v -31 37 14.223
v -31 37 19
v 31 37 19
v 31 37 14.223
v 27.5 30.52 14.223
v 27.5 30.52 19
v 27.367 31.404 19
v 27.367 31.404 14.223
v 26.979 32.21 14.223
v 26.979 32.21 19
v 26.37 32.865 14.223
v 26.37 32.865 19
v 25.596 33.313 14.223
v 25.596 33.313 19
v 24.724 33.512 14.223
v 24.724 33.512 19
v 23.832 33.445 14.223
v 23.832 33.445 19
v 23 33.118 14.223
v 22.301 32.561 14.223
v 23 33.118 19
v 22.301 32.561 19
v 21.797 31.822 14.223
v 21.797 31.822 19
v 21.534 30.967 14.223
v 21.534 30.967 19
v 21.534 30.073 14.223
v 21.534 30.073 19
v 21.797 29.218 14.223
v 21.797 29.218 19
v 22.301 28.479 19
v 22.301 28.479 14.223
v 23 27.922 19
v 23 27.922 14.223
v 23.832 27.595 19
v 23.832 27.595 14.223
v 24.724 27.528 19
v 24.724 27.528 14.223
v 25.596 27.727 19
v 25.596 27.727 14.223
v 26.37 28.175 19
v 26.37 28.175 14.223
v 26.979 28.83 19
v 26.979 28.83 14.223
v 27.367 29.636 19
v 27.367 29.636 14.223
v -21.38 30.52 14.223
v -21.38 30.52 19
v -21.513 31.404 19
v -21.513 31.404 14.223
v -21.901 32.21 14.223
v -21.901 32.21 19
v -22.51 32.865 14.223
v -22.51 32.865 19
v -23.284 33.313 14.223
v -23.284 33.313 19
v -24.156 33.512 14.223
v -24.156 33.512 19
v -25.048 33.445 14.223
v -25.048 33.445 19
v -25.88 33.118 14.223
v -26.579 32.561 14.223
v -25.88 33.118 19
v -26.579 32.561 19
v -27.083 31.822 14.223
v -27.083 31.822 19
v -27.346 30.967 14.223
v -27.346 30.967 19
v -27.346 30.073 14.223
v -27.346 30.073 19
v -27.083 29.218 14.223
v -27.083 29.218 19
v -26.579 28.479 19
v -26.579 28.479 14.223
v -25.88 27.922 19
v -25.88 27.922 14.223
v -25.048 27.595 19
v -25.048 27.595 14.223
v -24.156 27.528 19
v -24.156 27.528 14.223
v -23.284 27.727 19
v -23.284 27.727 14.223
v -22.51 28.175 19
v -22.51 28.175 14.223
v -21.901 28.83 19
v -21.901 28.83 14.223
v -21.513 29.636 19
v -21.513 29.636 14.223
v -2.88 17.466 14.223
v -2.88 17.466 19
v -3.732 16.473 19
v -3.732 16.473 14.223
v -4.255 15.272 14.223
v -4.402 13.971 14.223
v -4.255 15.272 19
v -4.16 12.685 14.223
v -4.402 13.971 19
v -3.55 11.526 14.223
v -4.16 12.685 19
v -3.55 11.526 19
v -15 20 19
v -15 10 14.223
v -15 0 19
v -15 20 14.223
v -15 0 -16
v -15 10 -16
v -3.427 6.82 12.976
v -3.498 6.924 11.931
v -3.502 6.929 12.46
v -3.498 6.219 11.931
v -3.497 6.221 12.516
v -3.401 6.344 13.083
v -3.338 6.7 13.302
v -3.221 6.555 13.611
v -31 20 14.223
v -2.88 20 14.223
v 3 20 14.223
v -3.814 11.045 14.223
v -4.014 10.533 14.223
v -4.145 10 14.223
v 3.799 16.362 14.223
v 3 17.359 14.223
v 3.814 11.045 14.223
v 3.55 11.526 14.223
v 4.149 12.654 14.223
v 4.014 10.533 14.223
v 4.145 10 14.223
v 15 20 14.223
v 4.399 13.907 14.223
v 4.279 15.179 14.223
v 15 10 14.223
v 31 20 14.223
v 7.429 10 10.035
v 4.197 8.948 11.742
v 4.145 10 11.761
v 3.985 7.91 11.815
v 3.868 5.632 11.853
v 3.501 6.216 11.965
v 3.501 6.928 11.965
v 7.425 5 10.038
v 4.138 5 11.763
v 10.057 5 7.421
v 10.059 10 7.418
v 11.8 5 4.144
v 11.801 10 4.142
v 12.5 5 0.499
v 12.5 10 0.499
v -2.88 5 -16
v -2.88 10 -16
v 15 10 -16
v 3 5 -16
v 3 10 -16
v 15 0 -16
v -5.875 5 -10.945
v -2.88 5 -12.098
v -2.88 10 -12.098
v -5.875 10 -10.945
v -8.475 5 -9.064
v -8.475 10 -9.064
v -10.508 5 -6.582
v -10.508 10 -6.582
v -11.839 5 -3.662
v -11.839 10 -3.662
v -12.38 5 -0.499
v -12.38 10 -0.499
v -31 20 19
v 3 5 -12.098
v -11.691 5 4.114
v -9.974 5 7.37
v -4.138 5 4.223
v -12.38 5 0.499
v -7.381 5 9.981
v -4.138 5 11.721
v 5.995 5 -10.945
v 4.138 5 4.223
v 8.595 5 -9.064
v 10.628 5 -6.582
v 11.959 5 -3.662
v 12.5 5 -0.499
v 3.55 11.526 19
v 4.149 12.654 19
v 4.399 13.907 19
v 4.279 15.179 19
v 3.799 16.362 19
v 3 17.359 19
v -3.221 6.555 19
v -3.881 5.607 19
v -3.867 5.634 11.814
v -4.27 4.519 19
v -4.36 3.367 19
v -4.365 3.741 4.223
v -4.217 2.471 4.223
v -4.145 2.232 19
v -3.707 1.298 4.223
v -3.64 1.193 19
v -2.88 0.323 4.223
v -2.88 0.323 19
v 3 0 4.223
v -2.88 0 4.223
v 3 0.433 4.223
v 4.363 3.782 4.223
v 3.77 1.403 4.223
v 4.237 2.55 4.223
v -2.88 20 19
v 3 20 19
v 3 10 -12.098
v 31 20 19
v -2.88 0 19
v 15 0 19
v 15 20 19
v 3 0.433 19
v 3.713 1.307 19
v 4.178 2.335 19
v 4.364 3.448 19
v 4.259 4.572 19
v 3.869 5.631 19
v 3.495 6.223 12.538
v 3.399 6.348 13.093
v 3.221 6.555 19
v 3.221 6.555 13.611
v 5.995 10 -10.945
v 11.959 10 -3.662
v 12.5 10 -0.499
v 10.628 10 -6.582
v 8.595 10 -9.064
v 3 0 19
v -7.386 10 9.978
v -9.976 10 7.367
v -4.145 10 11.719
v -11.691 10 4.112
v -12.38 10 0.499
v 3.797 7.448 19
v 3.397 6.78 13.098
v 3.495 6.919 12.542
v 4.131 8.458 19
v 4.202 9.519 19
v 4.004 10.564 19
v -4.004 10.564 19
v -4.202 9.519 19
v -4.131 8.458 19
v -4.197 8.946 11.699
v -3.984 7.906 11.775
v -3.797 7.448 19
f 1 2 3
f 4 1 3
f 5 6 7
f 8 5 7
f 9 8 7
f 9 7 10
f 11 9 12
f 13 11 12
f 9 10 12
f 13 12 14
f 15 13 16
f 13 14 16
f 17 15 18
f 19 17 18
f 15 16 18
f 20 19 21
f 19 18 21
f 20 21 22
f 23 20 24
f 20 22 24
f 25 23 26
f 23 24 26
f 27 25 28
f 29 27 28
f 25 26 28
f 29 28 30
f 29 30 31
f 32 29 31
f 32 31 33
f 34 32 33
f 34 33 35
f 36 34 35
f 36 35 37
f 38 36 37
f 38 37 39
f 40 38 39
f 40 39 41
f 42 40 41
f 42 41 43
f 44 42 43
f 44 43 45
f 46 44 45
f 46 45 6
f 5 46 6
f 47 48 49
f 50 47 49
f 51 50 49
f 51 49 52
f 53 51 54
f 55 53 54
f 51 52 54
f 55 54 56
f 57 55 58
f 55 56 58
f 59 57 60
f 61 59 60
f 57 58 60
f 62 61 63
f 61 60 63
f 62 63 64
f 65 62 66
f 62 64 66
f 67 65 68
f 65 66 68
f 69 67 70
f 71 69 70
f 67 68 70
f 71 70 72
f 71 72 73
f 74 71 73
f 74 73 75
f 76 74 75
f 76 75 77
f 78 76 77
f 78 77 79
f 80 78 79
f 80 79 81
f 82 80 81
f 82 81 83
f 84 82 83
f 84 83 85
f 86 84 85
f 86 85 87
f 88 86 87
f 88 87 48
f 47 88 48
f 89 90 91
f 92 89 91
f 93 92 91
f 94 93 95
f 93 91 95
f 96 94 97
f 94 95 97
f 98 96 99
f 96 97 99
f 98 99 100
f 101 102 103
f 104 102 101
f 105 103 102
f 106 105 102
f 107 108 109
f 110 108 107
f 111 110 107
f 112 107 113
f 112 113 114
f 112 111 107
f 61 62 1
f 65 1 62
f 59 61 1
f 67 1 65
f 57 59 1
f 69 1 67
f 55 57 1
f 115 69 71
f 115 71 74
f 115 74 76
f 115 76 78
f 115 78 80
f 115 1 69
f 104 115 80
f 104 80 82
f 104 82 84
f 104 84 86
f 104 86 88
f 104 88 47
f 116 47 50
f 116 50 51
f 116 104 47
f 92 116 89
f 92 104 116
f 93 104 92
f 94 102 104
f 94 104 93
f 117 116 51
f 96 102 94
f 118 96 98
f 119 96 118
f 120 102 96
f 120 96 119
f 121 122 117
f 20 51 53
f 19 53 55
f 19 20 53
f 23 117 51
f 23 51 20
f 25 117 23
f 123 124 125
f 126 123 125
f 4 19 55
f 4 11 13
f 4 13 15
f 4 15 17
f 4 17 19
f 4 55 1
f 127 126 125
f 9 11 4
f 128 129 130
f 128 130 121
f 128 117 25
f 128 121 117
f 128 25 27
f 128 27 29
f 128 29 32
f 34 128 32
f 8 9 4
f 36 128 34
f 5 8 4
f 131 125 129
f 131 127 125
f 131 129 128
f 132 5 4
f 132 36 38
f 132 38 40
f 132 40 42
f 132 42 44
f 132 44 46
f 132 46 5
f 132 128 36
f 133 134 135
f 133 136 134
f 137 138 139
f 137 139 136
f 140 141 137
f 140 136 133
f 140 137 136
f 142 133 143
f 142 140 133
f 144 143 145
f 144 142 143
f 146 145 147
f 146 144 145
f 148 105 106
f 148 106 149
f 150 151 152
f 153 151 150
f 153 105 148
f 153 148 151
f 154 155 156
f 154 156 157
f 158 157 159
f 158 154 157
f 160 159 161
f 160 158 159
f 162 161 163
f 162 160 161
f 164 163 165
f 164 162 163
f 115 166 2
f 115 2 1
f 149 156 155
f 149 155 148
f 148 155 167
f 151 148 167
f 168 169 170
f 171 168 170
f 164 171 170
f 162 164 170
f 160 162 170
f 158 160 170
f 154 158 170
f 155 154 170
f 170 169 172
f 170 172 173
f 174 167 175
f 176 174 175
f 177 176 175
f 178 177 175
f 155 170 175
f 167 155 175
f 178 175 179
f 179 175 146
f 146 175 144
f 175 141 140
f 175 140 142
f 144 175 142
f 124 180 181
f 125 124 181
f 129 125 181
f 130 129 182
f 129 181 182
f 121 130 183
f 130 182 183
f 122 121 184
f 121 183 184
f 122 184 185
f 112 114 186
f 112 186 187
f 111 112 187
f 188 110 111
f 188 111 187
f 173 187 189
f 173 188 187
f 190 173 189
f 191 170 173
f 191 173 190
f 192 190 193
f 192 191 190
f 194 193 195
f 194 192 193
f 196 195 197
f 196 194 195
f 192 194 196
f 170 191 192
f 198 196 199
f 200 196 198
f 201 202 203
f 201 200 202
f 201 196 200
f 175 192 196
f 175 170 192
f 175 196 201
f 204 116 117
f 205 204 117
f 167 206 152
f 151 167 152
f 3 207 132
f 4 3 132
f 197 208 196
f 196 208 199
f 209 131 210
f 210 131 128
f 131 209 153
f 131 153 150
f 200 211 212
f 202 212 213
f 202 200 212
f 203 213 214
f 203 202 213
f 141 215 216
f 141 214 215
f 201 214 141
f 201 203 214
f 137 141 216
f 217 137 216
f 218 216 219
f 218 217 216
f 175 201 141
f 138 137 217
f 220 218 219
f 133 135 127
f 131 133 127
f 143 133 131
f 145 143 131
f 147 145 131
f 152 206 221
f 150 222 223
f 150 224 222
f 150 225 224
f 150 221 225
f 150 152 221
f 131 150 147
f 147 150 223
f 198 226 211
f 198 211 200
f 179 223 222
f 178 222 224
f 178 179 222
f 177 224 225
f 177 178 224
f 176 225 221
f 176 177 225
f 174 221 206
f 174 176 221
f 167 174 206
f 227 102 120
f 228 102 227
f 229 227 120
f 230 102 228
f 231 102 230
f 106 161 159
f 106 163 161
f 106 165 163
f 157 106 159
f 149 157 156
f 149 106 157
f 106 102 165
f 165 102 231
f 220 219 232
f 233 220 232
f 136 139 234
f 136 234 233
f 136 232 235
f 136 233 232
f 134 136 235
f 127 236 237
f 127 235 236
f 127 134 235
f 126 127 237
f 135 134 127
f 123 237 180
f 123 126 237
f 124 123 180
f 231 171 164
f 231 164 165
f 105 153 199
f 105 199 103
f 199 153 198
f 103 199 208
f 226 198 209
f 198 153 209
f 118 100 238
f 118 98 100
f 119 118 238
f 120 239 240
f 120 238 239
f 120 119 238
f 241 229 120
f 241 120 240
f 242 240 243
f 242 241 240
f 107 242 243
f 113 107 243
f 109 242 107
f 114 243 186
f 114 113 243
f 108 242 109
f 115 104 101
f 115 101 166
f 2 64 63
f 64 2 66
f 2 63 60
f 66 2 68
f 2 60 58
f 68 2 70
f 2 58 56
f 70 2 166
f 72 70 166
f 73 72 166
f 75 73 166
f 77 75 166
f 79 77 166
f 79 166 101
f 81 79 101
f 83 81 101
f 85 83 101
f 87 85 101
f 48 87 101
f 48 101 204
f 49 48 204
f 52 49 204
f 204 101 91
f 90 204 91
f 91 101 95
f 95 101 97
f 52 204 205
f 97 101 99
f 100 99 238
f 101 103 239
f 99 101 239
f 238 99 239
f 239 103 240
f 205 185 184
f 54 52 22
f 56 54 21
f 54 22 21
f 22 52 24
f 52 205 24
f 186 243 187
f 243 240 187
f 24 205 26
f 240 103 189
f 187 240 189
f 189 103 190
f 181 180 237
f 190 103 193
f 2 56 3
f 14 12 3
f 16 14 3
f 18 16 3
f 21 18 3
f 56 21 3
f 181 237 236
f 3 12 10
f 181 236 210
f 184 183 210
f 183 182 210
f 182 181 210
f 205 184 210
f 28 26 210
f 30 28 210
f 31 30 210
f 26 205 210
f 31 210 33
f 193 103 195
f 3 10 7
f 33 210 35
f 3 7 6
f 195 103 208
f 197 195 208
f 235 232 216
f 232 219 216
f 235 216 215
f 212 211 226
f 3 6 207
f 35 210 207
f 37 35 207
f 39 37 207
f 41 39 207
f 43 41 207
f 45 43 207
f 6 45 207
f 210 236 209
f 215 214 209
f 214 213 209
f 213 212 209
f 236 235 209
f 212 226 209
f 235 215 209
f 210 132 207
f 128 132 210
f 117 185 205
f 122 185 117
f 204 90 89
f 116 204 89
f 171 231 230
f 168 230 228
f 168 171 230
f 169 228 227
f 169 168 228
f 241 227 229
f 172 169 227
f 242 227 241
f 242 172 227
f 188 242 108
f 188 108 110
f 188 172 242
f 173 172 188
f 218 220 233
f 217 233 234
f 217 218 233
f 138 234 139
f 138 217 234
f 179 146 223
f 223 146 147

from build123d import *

# Parameters (mm, degrees)
SKETCH_1_W                = 70
SKETCH_1_H                = 43
EXTRUDE_1_DEPTH           = 10
SKETCH_8_W                = 24.88
SKETCH_8_H                = 5
CUT_EXTRUDE_4_DEPTH       = 57.338264084
EXTRUDE_1_2_DEPTH         = 5
EXTRUDE_1_2_DEPTH_BACK    = 2
SKETCH_11_R               = 20.45
SKETCH_11_R_2             = 12.45
CUT_EXTRUDE_6_DEPTH       = 5
CUT_EXTRUDE_7_DEPTH       = 5
SKETCH_16_W               = 5.88
SKETCH_16_H               = 11
CUT_EXTRUDE_8_DEPTH       = 5
SKETCH_17_W               = 5.88
SKETCH_17_H               = 8.352111755
CUT_EXTRUDE_9_DEPTH       = 5
CUT_EXTRUDE_10_DEPTH      = 5
CUT_EXTRUDE_11_DEPTH      = 5
SKETCH_21_R               = 3
CUT_EXTRUDE_12_DEPTH      = 43.275879648
SKETCH_22_R               = 3
CUT_EXTRUDE_13_DEPTH      = 43.275879648
SKETCH_24_R               = 3.51
CUT_EXTRUDE_15_DEPTH      = 7
SKETCH_25_W               = 22.5
SKETCH_25_H               = 10
EXTRUDE_2_DEPTH           = 5
SKETCH_26_W               = 22.62
SKETCH_26_H               = 10
EXTRUDE_3_DEPTH           = 5
SKETCH_28_W               = 5.88
SKETCH_28_H               = 7.531424881
CUT_EXTRUDE_16_DEPTH      = 5
CUT_EXTRUDE_2_DEPTH       = 45
CUT_EXTRUDE_2_DEPTH_BACK  = 31
SKETCH_32_W               = 110
SKETCH_32_H               = 112
SKETCH_32_W_2             = 30
SKETCH_32_H_2             = 32
SKETCH_33_W               = 12
SKETCH_33_H               = 10
SKETCH_33_W_2             = 12.12
EXTRUDE_5_DEPTH           = 3
SKETCH_40_W               = 12
SKETCH_40_H               = 4.777354505
EXTRUDE_7_DEPTH           = 10
SKETCH_41_W               = 12.12
SKETCH_41_H               = 4.777354505
EXTRUDE_8_DEPTH           = 10
CUT_EXTRUDE_17_DEPTH      = 10
CUT_EXTRUDE_17_DEPTH_BACK = 10
SKETCH_42_R               = 4.209320402
SKETCH_53_W               = 4.777354505
SKETCH_53_H               = 10
EXTRUDE_9_DEPTH           = 11
SKETCH_56_W               = 4.777354505
SKETCH_56_H               = 20
EXTRUDE_10_DEPTH          = 11
SKETCH_57_W               = 4.777354505
SKETCH_57_H               = 10
CUT_EXTRUDE_18_DEPTH      = 11
SKETCH_58_W               = 4.777354505
SKETCH_58_H               = 10
EXTRUDE_11_DEPTH          = 5
SKETCH_59_W               = 4.777354505
SKETCH_59_H               = 10
EXTRUDE_12_DEPTH          = 5
SKETCH_60_W               = 62
SKETCH_60_H               = 4.777354505
EXTRUDE_13_DEPTH          = 10
SKETCH_61_W               = 5.88
SKETCH_61_H               = 5
CUT_EXTRUDE_19_DEPTH      = 10
SKETCH_69_W               = 4.777354505
SKETCH_69_H               = 10
EXTRUDE_14_DEPTH          = 16
SKETCH_70_W               = 4.777354505
SKETCH_70_H               = 10
EXTRUDE_15_DEPTH          = 16
SKETCH_83_W               = 62
SKETCH_83_H               = 4.777354505
EXTRUDE_16_DEPTH          = 29
SKETCH_86_R               = 3
CUT_EXTRUDE_20_DEPTH      = 76.279479276
SKETCH_85_R               = 3
CUT_EXTRUDE_21_DEPTH      = 76.279479276
SKETCH_87_W               = 62
SKETCH_87_H               = 22
CUT_EXTRUDE_22_DEPTH      = 76.279479276
SKETCH_90_W               = 16.042506896
SKETCH_90_H               = 20
SKETCH_90_W_2             = 16.042536038
CUT_EXTRUDE_23_DEPTH      = 10
SKETCH_91_R               = 4.404741758
CUT_EXTRUDE_24_DEPTH      = 10
SKETCH_92_R               = 4.366810658
CUT_EXTRUDE_25_DEPTH      = 53.335030246


with BuildPart() as part:
    # 草圖1 → Extrude 1 (new body)
    with BuildSketch(Plane(origin=(0, 0, 0), x_dir=(1, 0, 0), z_dir=(0, 1, 0))):
        Rectangle(SKETCH_1_W, SKETCH_1_H)
    extrude(amount=EXTRUDE_1_DEPTH)

    # 草圖8 → 除料-伸長4 (cut, through all)
    with BuildSketch(Plane.XY.offset(21.5)):
        with Locations((0.06, 7.5)):
            Rectangle(SKETCH_8_W, SKETCH_8_H)
    extrude(amount=-CUT_EXTRUDE_4_DEPTH, mode=Mode.SUBTRACT)

    # 草圖11 → Extrude 1 2 (add, two sides: drawn at the far end of the back side and taken through both)
    with BuildSketch(Plane(origin=(0, 5, 0), x_dir=(1, 0, 0), z_dir=(0, 1, 0)).offset(-EXTRUDE_1_2_DEPTH_BACK)):
        with Locations((0.06, 0)):
            Circle(SKETCH_11_R)
        with Locations((0.06, 0)):
            Circle(SKETCH_11_R_2, mode=Mode.SUBTRACT)
    extrude(amount=EXTRUDE_1_2_DEPTH + EXTRUDE_1_2_DEPTH_BACK)

    # 草圖14 → 除料-伸長6 (cut)
    with BuildSketch(Plane(origin=(0, 5, 0), x_dir=(1, 0, 0), z_dir=(0, 1, 0))):
        Polygon((0.06, -20.45), (12.5, -20.45), (12.5, -21.5), (-12.38, -21.5), (-12.38, -20.45), align=None)
    extrude(amount=-CUT_EXTRUDE_6_DEPTH, mode=Mode.SUBTRACT)

    # 草圖15 → 除料-伸長7 (cut)
    with BuildSketch(Plane(origin=(0, 5, 0), x_dir=(1, 0, 0), z_dir=(0, 1, 0))):
        Polygon((0.06, 20.45), (12.5, 20.45), (12.5, 21.5), (-12.38, 21.5), (-12.38, 20.45), align=None)
    extrude(amount=-CUT_EXTRUDE_7_DEPTH, mode=Mode.SUBTRACT)

    # 草圖16 → 除料-伸長8 (cut)
    with BuildSketch(Plane(origin=(0, 10, 0), x_dir=(1, 0, 0), z_dir=(0, 1, 0))):
        with Locations((0.06, 17.597888245)):
            Rectangle(SKETCH_16_W, SKETCH_16_H)
    extrude(amount=-CUT_EXTRUDE_8_DEPTH, mode=Mode.SUBTRACT)

    # 草圖17 → 除料-伸長9 (cut)
    with BuildSketch(Plane(origin=(0, 10, 0), x_dir=(1, 0, 0), z_dir=(0, 1, 0))):
        with Locations((0.06, -16.273944123)):
            Rectangle(SKETCH_17_W, SKETCH_17_H)
    extrude(amount=-CUT_EXTRUDE_9_DEPTH, mode=Mode.SUBTRACT)

    # 草圖19 → 除料-伸長10 (cut)
    with BuildSketch(Plane(origin=(0, 5, 0), x_dir=(1, 0, 0), z_dir=(0, 1, 0))):
        Polygon((-2.88, 20.237561612), (-2.88, 20.45), (2.98755849, 20.45), (3, 20.237561612), align=None)
    extrude(amount=-CUT_EXTRUDE_10_DEPTH, mode=Mode.SUBTRACT)

    # 草圖20 → 除料-伸長11 (cut)
    with BuildSketch(Plane(origin=(0, 5, 0), x_dir=(1, 0, 0), z_dir=(0, 1, 0))):
        Polygon((3, -20.237561612), (3, -20.45), (-2.887827835, -20.45), (-2.88, -20.237561612), align=None)
    extrude(amount=-CUT_EXTRUDE_11_DEPTH, mode=Mode.SUBTRACT)

    # 草圖21 → 除料-伸長12 (cut, through all)
    with BuildSketch(Plane(origin=(0, 10, 0), x_dir=(1, 0, 0), z_dir=(0, 1, 0))):
        with Locations(Location((-25, 11.5, 0), (0, 0, 270))):
            Circle(SKETCH_21_R)
    extrude(amount=-CUT_EXTRUDE_12_DEPTH, mode=Mode.SUBTRACT)

    # 草圖22 → 除料-伸長13 (cut, through all)
    with BuildSketch(Plane(origin=(0, 10, 0), x_dir=(1, 0, 0), z_dir=(0, 1, 0))):
        with Locations(Location((25, 11.5, 0), (0, 0, 270))):
            Circle(SKETCH_22_R)
    extrude(amount=-CUT_EXTRUDE_13_DEPTH, mode=Mode.SUBTRACT)

    # 草圖24 → 除料-伸長15 (cut)
    with BuildSketch(Plane(origin=(0, 5, 0), x_dir=(1, 0, 0), z_dir=(0, 1, 0))):
        with Locations((0, -12.216230782)):
            Circle(SKETCH_24_R)
    extrude(amount=CUT_EXTRUDE_15_DEPTH, mode=Mode.SUBTRACT)

    # 草圖25 → 填料-伸長2 (add)
    with BuildSketch(Plane.XY.offset(21.5)):
        with Locations((23.75, 5)):
            Rectangle(SKETCH_25_W, SKETCH_25_H)
    extrude(amount=EXTRUDE_2_DEPTH)

    # 草圖26 → 填料-伸長3 (add)
    with BuildSketch(Plane.XY.offset(21.5)):
        with Locations((-23.69, 5)):
            Rectangle(SKETCH_26_W, SKETCH_26_H)
    extrude(amount=EXTRUDE_3_DEPTH)

    # 草圖28 → 除料-伸長16 (cut)
    with BuildSketch(Plane(origin=(0, 5, 0), x_dir=(1, 0, 0), z_dir=(0, 1, 0))):
        with Locations((0.06, -17.988357936)):
            Rectangle(SKETCH_28_W, SKETCH_28_H)
    extrude(amount=-CUT_EXTRUDE_16_DEPTH, mode=Mode.SUBTRACT)

    # 草圖32 → 除料-伸長-薄件2 (cut, two sides: drawn at the far end of the back side and taken through both)
    with BuildSketch(Plane(origin=(0, 5, 0), x_dir=(1, 0, 0), z_dir=(0, 1, 0)).offset(-CUT_EXTRUDE_2_DEPTH_BACK)):
        Rectangle(SKETCH_32_W, SKETCH_32_H)
        Rectangle(SKETCH_32_W_2, SKETCH_32_H_2, mode=Mode.SUBTRACT)
    extrude(amount=CUT_EXTRUDE_2_DEPTH + CUT_EXTRUDE_2_DEPTH_BACK, mode=Mode.SUBTRACT)

    # 草圖33 → 填料-伸長5 (add)
    with BuildSketch(Plane.XY.offset(16)):
        with Locations((9, 5)):
            Rectangle(SKETCH_33_W, SKETCH_33_H)
        with Locations((-8.94, 5)):
            Rectangle(SKETCH_33_W_2, SKETCH_33_H)
    extrude(amount=EXTRUDE_5_DEPTH)

    # 草圖40 → 填料-伸長7 (add)
    with BuildSketch(Plane(origin=(0, 10, 0), x_dir=(1, 0, 0), z_dir=(0, 1, 0))):
        with Locations((9, -16.611322748)):
            Rectangle(SKETCH_40_W, SKETCH_40_H)
    extrude(amount=EXTRUDE_7_DEPTH)

    # 草圖41 → 填料-伸長8 (add)
    with BuildSketch(Plane(origin=(0, 10, 0), x_dir=(1, 0, 0), z_dir=(0, 1, 0))):
        with Locations((-8.94, -16.611322748)):
            Rectangle(SKETCH_41_W, SKETCH_41_H)
    extrude(amount=EXTRUDE_8_DEPTH)

    # 草圖42 → 除料-伸長17 (cut, two sides: drawn at the far end of the back side and taken through both)
    with BuildSketch(Plane.XY.offset(14.222645495).offset(-CUT_EXTRUDE_17_DEPTH_BACK)):
        with Locations((0, 9.264740645)):
            Circle(SKETCH_42_R)
    extrude(amount=CUT_EXTRUDE_17_DEPTH + CUT_EXTRUDE_17_DEPTH_BACK, mode=Mode.SUBTRACT)

    # 草圖53 → 填料-伸長9 (add)
    with BuildSketch(Plane.ZY.offset(15)):
        with Locations((16.611322748, 15)):
            Rectangle(SKETCH_53_W, SKETCH_53_H)
    extrude(amount=EXTRUDE_9_DEPTH)

    # 草圖56 → 填料-伸長10 (add)
    with BuildSketch(Plane(origin=(15, 0, 0), x_dir=(0, 0, -1), z_dir=(1, 0, 0))):
        with Locations((-16.611322748, 10)):
            Rectangle(SKETCH_56_W, SKETCH_56_H)
    extrude(amount=EXTRUDE_10_DEPTH)

    # 草圖57 → 除料-伸長18 (cut)
    with BuildSketch(Plane(origin=(26, 0, 0), x_dir=(0, 0, -1), z_dir=(1, 0, 0))):
        with Locations((-16.611322748, 5)):
            Rectangle(SKETCH_57_W, SKETCH_57_H)
    extrude(amount=-CUT_EXTRUDE_18_DEPTH, mode=Mode.SUBTRACT)

    # 草圖58 → 填料-伸長11 (add)
    with BuildSketch(Plane(origin=(26, 0, 0), x_dir=(0, 0, -1), z_dir=(1, 0, 0))):
        with Locations((-16.611322748, 15)):
            Rectangle(SKETCH_58_W, SKETCH_58_H)
    extrude(amount=EXTRUDE_11_DEPTH)

    # 草圖59 → 填料-伸長12 (add)
    with BuildSketch(Plane.ZY.offset(26)):
        with Locations((16.611322748, 15)):
            Rectangle(SKETCH_59_W, SKETCH_59_H)
    extrude(amount=EXTRUDE_12_DEPTH)

    # 草圖60 → 填料-伸長13 (add)
    with BuildSketch(Plane(origin=(0, 20, 0), x_dir=(1, 0, 0), z_dir=(0, 1, 0))):
        with Locations((0, -16.611322748)):
            Rectangle(SKETCH_60_W, SKETCH_60_H)
    extrude(amount=EXTRUDE_13_DEPTH)

    # 草圖61 → 除料-伸長19 (cut)
    with BuildSketch(Plane.XY.offset(14.222645495)):
        with Locations((0.06, 2.5)):
            Rectangle(SKETCH_61_W, SKETCH_61_H)
    extrude(amount=-CUT_EXTRUDE_19_DEPTH, mode=Mode.SUBTRACT)

    # 草圖69 → 填料-伸長14 (add)
    with BuildSketch(Plane(origin=(15, 0, 0), x_dir=(0, 0, -1), z_dir=(1, 0, 0))):
        with Locations((-16.611322748, 5)):
            Rectangle(SKETCH_69_W, SKETCH_69_H)
    extrude(amount=EXTRUDE_14_DEPTH)

    # 草圖70 → 填料-伸長15 (add)
    with BuildSketch(Plane.ZY.offset(15)):
        with Locations((16.611322748, 5)):
            Rectangle(SKETCH_70_W, SKETCH_70_H)
    extrude(amount=EXTRUDE_15_DEPTH)

    # 草圖83 → 填料-伸長16 (add)
    with BuildSketch(Plane(origin=(0, 30, 0), x_dir=(1, 0, 0), z_dir=(0, 1, 0))):
        with Locations((0, -16.611322748)):
            Rectangle(SKETCH_83_W, SKETCH_83_H)
    extrude(amount=EXTRUDE_16_DEPTH)

    # 草圖86 → 除料-伸長20 (cut, through all)
    with BuildSketch(Plane.XY.offset(19)):
        with Locations((-24.38, 30.52)):
            Circle(SKETCH_86_R)
    extrude(amount=-CUT_EXTRUDE_20_DEPTH, mode=Mode.SUBTRACT)

    # 草圖85 → 除料-伸長21 (cut, through all)
    with BuildSketch(Plane.XY.offset(19)):
        with Locations((24.5, 30.52)):
            Circle(SKETCH_85_R)
    extrude(amount=-CUT_EXTRUDE_21_DEPTH, mode=Mode.SUBTRACT)

    # 草圖87 → 除料-伸長22 (cut, through all)
    with BuildSketch(Plane.XY.offset(19)):
        with Locations((0, 48)):
            Rectangle(SKETCH_87_W, SKETCH_87_H)
    extrude(amount=-CUT_EXTRUDE_22_DEPTH, mode=Mode.SUBTRACT)

    # 草圖90 → 除料-伸長23 (cut)
    with BuildSketch(Plane(origin=(0, 0, 14.222645495), x_dir=(-1, 0, 0), z_dir=(0, 0, -1))):
        with Locations((23.021253448, 10)):
            Rectangle(SKETCH_90_W, SKETCH_90_H)
        with Locations((-23.021268019, 10)):
            Rectangle(SKETCH_90_W_2, SKETCH_90_H)
    extrude(amount=-CUT_EXTRUDE_23_DEPTH, mode=Mode.SUBTRACT)

    # 草圖91 → 除料-伸長24 (cut)
    with BuildSketch(Plane.XY.offset(19)):
        with Locations((0, 14.133466634)):
            Circle(SKETCH_91_R)
    extrude(amount=-CUT_EXTRUDE_24_DEPTH, mode=Mode.SUBTRACT)

    # 草圖92 → 除料-伸長25 (cut, through all)
    with BuildSketch(Plane.XY.offset(4.222645495)):
        with Locations((0, 3.605723159)):
            Circle(SKETCH_92_R)
    extrude(amount=CUT_EXTRUDE_25_DEPTH, mode=Mode.SUBTRACT)


solid = part.part
